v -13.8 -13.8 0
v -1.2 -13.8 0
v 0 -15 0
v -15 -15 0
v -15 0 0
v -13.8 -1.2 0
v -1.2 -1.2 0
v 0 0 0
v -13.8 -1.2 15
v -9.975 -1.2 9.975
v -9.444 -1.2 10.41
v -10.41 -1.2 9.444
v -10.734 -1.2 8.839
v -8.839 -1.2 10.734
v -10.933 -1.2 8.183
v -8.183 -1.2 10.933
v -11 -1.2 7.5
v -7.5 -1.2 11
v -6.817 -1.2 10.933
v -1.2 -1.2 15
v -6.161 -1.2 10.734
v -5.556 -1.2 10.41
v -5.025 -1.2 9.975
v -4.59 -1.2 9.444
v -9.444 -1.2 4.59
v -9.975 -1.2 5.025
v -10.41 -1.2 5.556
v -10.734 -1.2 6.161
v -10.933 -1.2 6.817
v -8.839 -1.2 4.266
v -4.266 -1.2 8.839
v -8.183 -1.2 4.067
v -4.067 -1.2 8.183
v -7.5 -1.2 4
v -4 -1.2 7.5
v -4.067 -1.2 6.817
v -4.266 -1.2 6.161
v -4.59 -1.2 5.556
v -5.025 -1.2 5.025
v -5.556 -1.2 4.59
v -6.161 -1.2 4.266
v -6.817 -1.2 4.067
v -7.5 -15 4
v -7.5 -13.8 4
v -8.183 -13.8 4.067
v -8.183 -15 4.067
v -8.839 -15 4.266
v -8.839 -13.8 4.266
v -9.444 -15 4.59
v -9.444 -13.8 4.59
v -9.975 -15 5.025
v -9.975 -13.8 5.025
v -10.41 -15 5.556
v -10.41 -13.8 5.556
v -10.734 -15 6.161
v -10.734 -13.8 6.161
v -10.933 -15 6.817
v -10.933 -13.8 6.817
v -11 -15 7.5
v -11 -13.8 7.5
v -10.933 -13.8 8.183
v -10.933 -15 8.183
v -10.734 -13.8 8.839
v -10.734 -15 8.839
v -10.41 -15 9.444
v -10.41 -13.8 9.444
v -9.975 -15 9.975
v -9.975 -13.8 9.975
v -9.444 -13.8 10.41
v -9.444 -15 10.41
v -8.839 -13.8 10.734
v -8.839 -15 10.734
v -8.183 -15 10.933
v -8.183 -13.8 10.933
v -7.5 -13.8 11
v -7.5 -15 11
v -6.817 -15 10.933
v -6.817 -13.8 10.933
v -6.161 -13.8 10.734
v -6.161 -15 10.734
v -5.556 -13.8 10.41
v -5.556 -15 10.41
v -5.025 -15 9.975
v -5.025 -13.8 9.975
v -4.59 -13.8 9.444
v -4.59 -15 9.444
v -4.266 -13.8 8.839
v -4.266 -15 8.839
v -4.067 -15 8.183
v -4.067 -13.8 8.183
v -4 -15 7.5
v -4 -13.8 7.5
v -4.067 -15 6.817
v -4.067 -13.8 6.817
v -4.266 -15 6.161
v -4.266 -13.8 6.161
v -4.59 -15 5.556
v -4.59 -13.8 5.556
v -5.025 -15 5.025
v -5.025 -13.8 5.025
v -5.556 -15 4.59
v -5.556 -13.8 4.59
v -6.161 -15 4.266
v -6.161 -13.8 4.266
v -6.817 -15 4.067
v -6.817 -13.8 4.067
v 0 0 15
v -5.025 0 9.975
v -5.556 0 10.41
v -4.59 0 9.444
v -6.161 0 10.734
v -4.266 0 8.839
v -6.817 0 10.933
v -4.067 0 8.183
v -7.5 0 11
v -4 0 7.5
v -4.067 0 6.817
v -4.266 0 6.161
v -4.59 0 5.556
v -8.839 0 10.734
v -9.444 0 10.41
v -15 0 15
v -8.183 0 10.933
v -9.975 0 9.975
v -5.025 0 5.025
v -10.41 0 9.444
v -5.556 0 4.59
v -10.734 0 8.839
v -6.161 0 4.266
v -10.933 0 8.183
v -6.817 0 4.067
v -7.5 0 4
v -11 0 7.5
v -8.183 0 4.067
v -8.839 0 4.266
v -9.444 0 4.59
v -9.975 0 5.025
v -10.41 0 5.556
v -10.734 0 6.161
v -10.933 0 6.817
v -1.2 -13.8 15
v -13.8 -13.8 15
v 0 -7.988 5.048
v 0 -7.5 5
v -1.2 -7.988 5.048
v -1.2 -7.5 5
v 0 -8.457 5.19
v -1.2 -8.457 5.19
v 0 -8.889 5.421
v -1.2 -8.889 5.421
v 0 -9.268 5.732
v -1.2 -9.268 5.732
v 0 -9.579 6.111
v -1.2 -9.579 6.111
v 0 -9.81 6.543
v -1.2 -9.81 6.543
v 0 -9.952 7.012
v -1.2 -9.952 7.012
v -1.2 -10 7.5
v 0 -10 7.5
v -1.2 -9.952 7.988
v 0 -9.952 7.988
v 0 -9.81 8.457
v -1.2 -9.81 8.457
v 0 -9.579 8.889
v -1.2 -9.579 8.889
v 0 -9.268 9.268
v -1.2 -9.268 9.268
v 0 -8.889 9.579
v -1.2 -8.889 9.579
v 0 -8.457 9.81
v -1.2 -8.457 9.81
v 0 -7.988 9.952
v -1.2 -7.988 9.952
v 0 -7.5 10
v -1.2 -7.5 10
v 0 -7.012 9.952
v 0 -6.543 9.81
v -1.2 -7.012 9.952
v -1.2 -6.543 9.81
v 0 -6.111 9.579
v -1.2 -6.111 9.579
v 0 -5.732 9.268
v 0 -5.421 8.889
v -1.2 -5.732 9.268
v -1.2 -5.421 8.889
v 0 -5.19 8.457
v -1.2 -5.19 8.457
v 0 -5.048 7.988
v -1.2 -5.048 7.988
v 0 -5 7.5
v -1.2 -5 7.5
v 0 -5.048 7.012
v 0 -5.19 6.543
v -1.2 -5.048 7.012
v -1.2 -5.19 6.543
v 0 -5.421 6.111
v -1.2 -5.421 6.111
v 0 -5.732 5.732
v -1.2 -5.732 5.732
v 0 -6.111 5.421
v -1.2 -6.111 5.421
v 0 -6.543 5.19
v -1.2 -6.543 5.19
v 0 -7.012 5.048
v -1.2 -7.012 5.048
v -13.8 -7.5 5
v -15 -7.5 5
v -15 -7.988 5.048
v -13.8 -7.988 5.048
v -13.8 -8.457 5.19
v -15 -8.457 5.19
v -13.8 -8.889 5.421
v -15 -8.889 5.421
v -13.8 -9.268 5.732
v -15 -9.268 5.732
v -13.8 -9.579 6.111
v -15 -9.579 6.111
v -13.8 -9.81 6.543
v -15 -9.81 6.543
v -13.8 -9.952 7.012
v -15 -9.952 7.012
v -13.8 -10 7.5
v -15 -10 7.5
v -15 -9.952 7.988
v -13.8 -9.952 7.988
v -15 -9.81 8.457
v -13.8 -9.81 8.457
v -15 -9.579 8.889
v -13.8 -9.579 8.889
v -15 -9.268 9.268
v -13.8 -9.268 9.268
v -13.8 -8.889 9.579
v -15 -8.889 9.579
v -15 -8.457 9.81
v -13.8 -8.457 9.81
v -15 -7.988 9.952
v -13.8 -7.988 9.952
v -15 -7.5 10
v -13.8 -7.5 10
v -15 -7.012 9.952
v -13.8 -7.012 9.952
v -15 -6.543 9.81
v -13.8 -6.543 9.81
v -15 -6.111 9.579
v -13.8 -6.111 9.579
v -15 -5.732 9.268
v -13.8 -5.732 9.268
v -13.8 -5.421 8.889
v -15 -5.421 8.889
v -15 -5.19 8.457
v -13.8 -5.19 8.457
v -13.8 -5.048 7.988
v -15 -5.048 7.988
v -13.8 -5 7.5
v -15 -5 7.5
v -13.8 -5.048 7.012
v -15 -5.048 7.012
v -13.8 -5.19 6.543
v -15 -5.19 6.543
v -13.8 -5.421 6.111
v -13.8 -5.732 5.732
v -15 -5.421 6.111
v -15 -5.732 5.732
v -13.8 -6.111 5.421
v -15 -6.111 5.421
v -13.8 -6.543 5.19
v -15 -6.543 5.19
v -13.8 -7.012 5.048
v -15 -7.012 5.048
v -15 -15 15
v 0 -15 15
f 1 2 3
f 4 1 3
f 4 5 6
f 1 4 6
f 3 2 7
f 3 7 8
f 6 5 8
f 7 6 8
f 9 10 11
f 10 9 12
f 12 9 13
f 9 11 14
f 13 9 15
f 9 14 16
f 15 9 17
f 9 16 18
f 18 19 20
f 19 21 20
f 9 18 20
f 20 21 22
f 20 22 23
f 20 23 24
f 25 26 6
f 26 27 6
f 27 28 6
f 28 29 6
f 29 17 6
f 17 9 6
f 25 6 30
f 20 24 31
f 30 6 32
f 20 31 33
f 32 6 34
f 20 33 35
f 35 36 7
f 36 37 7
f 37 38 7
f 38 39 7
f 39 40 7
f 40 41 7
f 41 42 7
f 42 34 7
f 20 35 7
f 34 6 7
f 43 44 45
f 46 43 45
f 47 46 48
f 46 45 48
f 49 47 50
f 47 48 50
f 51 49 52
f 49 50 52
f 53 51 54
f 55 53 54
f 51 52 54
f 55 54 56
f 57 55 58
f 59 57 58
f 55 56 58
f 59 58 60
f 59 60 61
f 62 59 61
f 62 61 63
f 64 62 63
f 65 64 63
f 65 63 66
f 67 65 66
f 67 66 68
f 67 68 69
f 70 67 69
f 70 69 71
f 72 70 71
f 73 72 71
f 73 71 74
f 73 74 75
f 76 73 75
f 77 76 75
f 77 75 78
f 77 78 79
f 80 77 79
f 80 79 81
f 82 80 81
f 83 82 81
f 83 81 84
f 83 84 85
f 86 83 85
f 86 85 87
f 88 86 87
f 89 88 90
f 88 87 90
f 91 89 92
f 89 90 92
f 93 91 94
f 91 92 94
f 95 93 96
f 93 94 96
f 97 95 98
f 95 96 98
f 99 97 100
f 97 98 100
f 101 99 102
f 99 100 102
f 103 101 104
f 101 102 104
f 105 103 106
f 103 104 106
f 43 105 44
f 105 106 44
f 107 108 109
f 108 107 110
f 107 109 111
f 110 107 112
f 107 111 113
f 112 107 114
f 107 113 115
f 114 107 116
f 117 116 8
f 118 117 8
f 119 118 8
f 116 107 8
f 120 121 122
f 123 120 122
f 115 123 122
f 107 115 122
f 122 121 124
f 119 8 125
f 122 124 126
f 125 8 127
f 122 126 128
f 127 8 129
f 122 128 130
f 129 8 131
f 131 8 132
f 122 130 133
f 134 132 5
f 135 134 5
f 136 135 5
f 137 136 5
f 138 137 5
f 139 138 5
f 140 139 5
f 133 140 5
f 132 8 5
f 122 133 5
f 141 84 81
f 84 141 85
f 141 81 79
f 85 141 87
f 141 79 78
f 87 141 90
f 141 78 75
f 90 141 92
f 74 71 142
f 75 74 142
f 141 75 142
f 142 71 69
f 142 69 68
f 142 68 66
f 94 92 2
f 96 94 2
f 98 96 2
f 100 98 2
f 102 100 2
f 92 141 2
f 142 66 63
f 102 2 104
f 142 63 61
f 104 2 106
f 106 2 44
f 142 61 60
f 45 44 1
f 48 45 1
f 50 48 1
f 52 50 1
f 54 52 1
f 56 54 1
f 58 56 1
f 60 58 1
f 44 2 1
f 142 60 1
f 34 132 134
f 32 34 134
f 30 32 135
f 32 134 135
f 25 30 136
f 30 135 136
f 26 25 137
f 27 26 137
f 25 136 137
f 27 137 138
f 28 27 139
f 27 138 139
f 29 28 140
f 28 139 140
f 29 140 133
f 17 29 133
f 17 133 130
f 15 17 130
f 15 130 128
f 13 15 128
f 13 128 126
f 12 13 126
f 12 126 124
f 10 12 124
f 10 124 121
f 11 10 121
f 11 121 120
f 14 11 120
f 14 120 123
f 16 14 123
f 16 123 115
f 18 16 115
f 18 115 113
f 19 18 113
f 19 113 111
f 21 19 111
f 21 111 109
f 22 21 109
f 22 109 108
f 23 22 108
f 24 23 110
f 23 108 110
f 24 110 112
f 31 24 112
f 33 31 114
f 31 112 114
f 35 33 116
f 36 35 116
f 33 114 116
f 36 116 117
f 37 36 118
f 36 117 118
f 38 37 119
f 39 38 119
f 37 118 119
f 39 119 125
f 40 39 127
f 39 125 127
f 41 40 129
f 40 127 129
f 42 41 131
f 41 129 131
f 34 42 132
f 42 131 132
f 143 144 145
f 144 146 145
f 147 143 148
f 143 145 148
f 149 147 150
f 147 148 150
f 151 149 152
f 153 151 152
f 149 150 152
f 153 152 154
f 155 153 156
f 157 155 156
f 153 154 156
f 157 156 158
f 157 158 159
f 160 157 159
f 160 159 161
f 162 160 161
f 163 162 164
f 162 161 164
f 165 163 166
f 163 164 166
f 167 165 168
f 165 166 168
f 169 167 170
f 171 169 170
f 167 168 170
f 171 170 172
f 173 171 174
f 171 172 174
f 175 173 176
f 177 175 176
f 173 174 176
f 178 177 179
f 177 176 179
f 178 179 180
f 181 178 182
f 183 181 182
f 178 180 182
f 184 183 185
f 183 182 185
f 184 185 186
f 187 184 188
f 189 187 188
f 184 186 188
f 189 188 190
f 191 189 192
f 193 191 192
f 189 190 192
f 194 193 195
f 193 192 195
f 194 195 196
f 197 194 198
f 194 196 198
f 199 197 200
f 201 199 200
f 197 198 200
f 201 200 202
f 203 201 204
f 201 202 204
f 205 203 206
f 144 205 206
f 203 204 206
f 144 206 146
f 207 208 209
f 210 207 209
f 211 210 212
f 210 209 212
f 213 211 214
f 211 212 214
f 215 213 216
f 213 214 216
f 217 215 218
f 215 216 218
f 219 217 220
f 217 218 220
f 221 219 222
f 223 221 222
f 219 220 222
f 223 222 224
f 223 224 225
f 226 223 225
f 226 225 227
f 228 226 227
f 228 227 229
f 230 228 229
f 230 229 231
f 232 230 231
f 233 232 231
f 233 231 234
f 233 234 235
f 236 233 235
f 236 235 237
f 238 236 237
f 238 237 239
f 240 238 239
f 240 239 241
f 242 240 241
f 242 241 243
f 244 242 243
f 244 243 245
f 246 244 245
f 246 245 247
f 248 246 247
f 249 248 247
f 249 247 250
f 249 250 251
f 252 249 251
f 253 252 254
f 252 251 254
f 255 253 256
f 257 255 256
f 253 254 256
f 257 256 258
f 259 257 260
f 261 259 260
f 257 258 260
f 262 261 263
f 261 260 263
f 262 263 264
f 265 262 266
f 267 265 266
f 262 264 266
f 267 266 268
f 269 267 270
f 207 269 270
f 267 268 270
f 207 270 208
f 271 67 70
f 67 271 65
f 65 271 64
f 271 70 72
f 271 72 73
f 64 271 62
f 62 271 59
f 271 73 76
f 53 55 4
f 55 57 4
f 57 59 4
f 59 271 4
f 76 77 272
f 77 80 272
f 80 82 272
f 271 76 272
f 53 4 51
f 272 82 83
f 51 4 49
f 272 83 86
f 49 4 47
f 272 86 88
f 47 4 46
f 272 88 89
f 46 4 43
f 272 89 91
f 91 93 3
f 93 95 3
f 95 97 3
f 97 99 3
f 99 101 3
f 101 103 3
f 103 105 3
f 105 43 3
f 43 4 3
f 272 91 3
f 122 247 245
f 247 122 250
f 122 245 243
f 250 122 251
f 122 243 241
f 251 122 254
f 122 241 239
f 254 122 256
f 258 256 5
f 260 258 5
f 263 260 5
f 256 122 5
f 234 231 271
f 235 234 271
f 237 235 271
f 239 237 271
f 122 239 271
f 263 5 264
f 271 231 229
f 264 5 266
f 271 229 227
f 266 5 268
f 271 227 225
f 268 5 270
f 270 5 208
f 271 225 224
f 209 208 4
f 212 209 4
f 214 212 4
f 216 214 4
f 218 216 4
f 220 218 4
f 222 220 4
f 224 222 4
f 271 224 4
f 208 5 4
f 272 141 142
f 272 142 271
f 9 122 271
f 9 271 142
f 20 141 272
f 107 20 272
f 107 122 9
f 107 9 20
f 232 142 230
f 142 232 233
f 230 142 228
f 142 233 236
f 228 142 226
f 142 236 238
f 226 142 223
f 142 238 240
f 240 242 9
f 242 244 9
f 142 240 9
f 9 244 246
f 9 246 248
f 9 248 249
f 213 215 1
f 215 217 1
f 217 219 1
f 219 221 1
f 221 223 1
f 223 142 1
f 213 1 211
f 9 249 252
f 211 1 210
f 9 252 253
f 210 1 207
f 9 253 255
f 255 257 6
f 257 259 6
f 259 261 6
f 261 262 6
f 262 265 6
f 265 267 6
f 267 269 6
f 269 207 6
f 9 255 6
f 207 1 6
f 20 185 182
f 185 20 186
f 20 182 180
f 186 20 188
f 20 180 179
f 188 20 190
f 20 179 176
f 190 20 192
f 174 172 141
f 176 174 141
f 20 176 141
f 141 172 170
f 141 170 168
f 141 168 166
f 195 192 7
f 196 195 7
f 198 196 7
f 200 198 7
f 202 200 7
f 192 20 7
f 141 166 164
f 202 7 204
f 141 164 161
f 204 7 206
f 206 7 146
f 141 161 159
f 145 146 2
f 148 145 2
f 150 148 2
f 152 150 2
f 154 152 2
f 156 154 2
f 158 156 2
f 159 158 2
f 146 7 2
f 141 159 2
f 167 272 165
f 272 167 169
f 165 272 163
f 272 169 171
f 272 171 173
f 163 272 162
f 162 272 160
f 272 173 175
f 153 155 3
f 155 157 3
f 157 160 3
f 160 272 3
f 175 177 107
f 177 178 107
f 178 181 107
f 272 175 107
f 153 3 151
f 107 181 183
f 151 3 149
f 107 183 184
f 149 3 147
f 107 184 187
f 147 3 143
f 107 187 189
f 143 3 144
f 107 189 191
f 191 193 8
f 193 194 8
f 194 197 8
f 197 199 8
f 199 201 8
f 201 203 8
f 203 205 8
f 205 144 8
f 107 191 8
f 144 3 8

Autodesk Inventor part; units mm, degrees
ref_plane "YZ Plane" through (0, 0, 0) normal (1, 0, 0) x (0, 1, 0)
ref_plane "XZ Plane" through (0, 0, 0) normal (0, 1, 0) x (-1, 0, 0)
ref_plane "XY Plane" through (0, 0, 0) normal (0, 0, 1) x (1, 0, 0)
sketch "スケッチ1" plane through (0, 0, 0) normal (0, 0, 1) x (1, 0, 0)
  line L0 (0, 0) -> (-15, 0)
  line L1 (-15, 0) -> (-15, -15)
  line L2 (-15, -15) -> (0, -15)
  line L3 (0, -15) -> (0, 0)
  line L4 (-13.8, -1.2) -> (-1.2, -1.2)
  line L5 (-1.2, -1.2) -> (-1.2, -13.8)
  line L6 (-1.2, -13.8) -> (-13.8, -13.8)
  line L7 (-13.8, -13.8) -> (-13.8, -1.2)
  dimension "d0" = 15
  dimension "d1" = 15
  dimension "d2" = 1.2
  dimension "d3" = 1.2
  dimension "d4" = 1.2
  dimension "d5" = 1.2
extrude "押し出し1" add sketch "スケッチ1" along normal blind 15
sketch "スケッチ2" plane through (0, -15, 0) normal (1, 0, 0) x (0, 0, -1)
  line L0 (-15, 0) -> (-15, 15) projected
  line L1 (0, 15) -> (-15, 15) projected
  point P0 (-7.5, 7.5)
  dimension "d8" = 7.5
  dimension "d9" = 7.5
hole "穴1" at (0, -7.5, 7.5) direction (-1, 0, 0) diameter 5 end through all
sketch "スケッチ3" plane through (-15, -15, 0) normal (0, -1, 0) x (1, 0, 0)
  line L0 (0, 0) -> (15, 0) projected
  line L1 (0, 0) -> (0, 15) projected
  point P0 (7.5, 7.5)
  dimension "d17" = 7.5
  dimension "d18" = 7.5
hole "穴2" at (-7.5, -15, 7.5) direction (0, 1, 0) diameter 7 end through all
equation "\"d3\" = d2"
equation "\"d4\" = d3"
equation "\"d5\" = d3"
equation "\"d9\" = d8"
equation "\"d18\" = d17"
properties part number "ロボットベース15x15x15" material "アルミニウム 6061"
